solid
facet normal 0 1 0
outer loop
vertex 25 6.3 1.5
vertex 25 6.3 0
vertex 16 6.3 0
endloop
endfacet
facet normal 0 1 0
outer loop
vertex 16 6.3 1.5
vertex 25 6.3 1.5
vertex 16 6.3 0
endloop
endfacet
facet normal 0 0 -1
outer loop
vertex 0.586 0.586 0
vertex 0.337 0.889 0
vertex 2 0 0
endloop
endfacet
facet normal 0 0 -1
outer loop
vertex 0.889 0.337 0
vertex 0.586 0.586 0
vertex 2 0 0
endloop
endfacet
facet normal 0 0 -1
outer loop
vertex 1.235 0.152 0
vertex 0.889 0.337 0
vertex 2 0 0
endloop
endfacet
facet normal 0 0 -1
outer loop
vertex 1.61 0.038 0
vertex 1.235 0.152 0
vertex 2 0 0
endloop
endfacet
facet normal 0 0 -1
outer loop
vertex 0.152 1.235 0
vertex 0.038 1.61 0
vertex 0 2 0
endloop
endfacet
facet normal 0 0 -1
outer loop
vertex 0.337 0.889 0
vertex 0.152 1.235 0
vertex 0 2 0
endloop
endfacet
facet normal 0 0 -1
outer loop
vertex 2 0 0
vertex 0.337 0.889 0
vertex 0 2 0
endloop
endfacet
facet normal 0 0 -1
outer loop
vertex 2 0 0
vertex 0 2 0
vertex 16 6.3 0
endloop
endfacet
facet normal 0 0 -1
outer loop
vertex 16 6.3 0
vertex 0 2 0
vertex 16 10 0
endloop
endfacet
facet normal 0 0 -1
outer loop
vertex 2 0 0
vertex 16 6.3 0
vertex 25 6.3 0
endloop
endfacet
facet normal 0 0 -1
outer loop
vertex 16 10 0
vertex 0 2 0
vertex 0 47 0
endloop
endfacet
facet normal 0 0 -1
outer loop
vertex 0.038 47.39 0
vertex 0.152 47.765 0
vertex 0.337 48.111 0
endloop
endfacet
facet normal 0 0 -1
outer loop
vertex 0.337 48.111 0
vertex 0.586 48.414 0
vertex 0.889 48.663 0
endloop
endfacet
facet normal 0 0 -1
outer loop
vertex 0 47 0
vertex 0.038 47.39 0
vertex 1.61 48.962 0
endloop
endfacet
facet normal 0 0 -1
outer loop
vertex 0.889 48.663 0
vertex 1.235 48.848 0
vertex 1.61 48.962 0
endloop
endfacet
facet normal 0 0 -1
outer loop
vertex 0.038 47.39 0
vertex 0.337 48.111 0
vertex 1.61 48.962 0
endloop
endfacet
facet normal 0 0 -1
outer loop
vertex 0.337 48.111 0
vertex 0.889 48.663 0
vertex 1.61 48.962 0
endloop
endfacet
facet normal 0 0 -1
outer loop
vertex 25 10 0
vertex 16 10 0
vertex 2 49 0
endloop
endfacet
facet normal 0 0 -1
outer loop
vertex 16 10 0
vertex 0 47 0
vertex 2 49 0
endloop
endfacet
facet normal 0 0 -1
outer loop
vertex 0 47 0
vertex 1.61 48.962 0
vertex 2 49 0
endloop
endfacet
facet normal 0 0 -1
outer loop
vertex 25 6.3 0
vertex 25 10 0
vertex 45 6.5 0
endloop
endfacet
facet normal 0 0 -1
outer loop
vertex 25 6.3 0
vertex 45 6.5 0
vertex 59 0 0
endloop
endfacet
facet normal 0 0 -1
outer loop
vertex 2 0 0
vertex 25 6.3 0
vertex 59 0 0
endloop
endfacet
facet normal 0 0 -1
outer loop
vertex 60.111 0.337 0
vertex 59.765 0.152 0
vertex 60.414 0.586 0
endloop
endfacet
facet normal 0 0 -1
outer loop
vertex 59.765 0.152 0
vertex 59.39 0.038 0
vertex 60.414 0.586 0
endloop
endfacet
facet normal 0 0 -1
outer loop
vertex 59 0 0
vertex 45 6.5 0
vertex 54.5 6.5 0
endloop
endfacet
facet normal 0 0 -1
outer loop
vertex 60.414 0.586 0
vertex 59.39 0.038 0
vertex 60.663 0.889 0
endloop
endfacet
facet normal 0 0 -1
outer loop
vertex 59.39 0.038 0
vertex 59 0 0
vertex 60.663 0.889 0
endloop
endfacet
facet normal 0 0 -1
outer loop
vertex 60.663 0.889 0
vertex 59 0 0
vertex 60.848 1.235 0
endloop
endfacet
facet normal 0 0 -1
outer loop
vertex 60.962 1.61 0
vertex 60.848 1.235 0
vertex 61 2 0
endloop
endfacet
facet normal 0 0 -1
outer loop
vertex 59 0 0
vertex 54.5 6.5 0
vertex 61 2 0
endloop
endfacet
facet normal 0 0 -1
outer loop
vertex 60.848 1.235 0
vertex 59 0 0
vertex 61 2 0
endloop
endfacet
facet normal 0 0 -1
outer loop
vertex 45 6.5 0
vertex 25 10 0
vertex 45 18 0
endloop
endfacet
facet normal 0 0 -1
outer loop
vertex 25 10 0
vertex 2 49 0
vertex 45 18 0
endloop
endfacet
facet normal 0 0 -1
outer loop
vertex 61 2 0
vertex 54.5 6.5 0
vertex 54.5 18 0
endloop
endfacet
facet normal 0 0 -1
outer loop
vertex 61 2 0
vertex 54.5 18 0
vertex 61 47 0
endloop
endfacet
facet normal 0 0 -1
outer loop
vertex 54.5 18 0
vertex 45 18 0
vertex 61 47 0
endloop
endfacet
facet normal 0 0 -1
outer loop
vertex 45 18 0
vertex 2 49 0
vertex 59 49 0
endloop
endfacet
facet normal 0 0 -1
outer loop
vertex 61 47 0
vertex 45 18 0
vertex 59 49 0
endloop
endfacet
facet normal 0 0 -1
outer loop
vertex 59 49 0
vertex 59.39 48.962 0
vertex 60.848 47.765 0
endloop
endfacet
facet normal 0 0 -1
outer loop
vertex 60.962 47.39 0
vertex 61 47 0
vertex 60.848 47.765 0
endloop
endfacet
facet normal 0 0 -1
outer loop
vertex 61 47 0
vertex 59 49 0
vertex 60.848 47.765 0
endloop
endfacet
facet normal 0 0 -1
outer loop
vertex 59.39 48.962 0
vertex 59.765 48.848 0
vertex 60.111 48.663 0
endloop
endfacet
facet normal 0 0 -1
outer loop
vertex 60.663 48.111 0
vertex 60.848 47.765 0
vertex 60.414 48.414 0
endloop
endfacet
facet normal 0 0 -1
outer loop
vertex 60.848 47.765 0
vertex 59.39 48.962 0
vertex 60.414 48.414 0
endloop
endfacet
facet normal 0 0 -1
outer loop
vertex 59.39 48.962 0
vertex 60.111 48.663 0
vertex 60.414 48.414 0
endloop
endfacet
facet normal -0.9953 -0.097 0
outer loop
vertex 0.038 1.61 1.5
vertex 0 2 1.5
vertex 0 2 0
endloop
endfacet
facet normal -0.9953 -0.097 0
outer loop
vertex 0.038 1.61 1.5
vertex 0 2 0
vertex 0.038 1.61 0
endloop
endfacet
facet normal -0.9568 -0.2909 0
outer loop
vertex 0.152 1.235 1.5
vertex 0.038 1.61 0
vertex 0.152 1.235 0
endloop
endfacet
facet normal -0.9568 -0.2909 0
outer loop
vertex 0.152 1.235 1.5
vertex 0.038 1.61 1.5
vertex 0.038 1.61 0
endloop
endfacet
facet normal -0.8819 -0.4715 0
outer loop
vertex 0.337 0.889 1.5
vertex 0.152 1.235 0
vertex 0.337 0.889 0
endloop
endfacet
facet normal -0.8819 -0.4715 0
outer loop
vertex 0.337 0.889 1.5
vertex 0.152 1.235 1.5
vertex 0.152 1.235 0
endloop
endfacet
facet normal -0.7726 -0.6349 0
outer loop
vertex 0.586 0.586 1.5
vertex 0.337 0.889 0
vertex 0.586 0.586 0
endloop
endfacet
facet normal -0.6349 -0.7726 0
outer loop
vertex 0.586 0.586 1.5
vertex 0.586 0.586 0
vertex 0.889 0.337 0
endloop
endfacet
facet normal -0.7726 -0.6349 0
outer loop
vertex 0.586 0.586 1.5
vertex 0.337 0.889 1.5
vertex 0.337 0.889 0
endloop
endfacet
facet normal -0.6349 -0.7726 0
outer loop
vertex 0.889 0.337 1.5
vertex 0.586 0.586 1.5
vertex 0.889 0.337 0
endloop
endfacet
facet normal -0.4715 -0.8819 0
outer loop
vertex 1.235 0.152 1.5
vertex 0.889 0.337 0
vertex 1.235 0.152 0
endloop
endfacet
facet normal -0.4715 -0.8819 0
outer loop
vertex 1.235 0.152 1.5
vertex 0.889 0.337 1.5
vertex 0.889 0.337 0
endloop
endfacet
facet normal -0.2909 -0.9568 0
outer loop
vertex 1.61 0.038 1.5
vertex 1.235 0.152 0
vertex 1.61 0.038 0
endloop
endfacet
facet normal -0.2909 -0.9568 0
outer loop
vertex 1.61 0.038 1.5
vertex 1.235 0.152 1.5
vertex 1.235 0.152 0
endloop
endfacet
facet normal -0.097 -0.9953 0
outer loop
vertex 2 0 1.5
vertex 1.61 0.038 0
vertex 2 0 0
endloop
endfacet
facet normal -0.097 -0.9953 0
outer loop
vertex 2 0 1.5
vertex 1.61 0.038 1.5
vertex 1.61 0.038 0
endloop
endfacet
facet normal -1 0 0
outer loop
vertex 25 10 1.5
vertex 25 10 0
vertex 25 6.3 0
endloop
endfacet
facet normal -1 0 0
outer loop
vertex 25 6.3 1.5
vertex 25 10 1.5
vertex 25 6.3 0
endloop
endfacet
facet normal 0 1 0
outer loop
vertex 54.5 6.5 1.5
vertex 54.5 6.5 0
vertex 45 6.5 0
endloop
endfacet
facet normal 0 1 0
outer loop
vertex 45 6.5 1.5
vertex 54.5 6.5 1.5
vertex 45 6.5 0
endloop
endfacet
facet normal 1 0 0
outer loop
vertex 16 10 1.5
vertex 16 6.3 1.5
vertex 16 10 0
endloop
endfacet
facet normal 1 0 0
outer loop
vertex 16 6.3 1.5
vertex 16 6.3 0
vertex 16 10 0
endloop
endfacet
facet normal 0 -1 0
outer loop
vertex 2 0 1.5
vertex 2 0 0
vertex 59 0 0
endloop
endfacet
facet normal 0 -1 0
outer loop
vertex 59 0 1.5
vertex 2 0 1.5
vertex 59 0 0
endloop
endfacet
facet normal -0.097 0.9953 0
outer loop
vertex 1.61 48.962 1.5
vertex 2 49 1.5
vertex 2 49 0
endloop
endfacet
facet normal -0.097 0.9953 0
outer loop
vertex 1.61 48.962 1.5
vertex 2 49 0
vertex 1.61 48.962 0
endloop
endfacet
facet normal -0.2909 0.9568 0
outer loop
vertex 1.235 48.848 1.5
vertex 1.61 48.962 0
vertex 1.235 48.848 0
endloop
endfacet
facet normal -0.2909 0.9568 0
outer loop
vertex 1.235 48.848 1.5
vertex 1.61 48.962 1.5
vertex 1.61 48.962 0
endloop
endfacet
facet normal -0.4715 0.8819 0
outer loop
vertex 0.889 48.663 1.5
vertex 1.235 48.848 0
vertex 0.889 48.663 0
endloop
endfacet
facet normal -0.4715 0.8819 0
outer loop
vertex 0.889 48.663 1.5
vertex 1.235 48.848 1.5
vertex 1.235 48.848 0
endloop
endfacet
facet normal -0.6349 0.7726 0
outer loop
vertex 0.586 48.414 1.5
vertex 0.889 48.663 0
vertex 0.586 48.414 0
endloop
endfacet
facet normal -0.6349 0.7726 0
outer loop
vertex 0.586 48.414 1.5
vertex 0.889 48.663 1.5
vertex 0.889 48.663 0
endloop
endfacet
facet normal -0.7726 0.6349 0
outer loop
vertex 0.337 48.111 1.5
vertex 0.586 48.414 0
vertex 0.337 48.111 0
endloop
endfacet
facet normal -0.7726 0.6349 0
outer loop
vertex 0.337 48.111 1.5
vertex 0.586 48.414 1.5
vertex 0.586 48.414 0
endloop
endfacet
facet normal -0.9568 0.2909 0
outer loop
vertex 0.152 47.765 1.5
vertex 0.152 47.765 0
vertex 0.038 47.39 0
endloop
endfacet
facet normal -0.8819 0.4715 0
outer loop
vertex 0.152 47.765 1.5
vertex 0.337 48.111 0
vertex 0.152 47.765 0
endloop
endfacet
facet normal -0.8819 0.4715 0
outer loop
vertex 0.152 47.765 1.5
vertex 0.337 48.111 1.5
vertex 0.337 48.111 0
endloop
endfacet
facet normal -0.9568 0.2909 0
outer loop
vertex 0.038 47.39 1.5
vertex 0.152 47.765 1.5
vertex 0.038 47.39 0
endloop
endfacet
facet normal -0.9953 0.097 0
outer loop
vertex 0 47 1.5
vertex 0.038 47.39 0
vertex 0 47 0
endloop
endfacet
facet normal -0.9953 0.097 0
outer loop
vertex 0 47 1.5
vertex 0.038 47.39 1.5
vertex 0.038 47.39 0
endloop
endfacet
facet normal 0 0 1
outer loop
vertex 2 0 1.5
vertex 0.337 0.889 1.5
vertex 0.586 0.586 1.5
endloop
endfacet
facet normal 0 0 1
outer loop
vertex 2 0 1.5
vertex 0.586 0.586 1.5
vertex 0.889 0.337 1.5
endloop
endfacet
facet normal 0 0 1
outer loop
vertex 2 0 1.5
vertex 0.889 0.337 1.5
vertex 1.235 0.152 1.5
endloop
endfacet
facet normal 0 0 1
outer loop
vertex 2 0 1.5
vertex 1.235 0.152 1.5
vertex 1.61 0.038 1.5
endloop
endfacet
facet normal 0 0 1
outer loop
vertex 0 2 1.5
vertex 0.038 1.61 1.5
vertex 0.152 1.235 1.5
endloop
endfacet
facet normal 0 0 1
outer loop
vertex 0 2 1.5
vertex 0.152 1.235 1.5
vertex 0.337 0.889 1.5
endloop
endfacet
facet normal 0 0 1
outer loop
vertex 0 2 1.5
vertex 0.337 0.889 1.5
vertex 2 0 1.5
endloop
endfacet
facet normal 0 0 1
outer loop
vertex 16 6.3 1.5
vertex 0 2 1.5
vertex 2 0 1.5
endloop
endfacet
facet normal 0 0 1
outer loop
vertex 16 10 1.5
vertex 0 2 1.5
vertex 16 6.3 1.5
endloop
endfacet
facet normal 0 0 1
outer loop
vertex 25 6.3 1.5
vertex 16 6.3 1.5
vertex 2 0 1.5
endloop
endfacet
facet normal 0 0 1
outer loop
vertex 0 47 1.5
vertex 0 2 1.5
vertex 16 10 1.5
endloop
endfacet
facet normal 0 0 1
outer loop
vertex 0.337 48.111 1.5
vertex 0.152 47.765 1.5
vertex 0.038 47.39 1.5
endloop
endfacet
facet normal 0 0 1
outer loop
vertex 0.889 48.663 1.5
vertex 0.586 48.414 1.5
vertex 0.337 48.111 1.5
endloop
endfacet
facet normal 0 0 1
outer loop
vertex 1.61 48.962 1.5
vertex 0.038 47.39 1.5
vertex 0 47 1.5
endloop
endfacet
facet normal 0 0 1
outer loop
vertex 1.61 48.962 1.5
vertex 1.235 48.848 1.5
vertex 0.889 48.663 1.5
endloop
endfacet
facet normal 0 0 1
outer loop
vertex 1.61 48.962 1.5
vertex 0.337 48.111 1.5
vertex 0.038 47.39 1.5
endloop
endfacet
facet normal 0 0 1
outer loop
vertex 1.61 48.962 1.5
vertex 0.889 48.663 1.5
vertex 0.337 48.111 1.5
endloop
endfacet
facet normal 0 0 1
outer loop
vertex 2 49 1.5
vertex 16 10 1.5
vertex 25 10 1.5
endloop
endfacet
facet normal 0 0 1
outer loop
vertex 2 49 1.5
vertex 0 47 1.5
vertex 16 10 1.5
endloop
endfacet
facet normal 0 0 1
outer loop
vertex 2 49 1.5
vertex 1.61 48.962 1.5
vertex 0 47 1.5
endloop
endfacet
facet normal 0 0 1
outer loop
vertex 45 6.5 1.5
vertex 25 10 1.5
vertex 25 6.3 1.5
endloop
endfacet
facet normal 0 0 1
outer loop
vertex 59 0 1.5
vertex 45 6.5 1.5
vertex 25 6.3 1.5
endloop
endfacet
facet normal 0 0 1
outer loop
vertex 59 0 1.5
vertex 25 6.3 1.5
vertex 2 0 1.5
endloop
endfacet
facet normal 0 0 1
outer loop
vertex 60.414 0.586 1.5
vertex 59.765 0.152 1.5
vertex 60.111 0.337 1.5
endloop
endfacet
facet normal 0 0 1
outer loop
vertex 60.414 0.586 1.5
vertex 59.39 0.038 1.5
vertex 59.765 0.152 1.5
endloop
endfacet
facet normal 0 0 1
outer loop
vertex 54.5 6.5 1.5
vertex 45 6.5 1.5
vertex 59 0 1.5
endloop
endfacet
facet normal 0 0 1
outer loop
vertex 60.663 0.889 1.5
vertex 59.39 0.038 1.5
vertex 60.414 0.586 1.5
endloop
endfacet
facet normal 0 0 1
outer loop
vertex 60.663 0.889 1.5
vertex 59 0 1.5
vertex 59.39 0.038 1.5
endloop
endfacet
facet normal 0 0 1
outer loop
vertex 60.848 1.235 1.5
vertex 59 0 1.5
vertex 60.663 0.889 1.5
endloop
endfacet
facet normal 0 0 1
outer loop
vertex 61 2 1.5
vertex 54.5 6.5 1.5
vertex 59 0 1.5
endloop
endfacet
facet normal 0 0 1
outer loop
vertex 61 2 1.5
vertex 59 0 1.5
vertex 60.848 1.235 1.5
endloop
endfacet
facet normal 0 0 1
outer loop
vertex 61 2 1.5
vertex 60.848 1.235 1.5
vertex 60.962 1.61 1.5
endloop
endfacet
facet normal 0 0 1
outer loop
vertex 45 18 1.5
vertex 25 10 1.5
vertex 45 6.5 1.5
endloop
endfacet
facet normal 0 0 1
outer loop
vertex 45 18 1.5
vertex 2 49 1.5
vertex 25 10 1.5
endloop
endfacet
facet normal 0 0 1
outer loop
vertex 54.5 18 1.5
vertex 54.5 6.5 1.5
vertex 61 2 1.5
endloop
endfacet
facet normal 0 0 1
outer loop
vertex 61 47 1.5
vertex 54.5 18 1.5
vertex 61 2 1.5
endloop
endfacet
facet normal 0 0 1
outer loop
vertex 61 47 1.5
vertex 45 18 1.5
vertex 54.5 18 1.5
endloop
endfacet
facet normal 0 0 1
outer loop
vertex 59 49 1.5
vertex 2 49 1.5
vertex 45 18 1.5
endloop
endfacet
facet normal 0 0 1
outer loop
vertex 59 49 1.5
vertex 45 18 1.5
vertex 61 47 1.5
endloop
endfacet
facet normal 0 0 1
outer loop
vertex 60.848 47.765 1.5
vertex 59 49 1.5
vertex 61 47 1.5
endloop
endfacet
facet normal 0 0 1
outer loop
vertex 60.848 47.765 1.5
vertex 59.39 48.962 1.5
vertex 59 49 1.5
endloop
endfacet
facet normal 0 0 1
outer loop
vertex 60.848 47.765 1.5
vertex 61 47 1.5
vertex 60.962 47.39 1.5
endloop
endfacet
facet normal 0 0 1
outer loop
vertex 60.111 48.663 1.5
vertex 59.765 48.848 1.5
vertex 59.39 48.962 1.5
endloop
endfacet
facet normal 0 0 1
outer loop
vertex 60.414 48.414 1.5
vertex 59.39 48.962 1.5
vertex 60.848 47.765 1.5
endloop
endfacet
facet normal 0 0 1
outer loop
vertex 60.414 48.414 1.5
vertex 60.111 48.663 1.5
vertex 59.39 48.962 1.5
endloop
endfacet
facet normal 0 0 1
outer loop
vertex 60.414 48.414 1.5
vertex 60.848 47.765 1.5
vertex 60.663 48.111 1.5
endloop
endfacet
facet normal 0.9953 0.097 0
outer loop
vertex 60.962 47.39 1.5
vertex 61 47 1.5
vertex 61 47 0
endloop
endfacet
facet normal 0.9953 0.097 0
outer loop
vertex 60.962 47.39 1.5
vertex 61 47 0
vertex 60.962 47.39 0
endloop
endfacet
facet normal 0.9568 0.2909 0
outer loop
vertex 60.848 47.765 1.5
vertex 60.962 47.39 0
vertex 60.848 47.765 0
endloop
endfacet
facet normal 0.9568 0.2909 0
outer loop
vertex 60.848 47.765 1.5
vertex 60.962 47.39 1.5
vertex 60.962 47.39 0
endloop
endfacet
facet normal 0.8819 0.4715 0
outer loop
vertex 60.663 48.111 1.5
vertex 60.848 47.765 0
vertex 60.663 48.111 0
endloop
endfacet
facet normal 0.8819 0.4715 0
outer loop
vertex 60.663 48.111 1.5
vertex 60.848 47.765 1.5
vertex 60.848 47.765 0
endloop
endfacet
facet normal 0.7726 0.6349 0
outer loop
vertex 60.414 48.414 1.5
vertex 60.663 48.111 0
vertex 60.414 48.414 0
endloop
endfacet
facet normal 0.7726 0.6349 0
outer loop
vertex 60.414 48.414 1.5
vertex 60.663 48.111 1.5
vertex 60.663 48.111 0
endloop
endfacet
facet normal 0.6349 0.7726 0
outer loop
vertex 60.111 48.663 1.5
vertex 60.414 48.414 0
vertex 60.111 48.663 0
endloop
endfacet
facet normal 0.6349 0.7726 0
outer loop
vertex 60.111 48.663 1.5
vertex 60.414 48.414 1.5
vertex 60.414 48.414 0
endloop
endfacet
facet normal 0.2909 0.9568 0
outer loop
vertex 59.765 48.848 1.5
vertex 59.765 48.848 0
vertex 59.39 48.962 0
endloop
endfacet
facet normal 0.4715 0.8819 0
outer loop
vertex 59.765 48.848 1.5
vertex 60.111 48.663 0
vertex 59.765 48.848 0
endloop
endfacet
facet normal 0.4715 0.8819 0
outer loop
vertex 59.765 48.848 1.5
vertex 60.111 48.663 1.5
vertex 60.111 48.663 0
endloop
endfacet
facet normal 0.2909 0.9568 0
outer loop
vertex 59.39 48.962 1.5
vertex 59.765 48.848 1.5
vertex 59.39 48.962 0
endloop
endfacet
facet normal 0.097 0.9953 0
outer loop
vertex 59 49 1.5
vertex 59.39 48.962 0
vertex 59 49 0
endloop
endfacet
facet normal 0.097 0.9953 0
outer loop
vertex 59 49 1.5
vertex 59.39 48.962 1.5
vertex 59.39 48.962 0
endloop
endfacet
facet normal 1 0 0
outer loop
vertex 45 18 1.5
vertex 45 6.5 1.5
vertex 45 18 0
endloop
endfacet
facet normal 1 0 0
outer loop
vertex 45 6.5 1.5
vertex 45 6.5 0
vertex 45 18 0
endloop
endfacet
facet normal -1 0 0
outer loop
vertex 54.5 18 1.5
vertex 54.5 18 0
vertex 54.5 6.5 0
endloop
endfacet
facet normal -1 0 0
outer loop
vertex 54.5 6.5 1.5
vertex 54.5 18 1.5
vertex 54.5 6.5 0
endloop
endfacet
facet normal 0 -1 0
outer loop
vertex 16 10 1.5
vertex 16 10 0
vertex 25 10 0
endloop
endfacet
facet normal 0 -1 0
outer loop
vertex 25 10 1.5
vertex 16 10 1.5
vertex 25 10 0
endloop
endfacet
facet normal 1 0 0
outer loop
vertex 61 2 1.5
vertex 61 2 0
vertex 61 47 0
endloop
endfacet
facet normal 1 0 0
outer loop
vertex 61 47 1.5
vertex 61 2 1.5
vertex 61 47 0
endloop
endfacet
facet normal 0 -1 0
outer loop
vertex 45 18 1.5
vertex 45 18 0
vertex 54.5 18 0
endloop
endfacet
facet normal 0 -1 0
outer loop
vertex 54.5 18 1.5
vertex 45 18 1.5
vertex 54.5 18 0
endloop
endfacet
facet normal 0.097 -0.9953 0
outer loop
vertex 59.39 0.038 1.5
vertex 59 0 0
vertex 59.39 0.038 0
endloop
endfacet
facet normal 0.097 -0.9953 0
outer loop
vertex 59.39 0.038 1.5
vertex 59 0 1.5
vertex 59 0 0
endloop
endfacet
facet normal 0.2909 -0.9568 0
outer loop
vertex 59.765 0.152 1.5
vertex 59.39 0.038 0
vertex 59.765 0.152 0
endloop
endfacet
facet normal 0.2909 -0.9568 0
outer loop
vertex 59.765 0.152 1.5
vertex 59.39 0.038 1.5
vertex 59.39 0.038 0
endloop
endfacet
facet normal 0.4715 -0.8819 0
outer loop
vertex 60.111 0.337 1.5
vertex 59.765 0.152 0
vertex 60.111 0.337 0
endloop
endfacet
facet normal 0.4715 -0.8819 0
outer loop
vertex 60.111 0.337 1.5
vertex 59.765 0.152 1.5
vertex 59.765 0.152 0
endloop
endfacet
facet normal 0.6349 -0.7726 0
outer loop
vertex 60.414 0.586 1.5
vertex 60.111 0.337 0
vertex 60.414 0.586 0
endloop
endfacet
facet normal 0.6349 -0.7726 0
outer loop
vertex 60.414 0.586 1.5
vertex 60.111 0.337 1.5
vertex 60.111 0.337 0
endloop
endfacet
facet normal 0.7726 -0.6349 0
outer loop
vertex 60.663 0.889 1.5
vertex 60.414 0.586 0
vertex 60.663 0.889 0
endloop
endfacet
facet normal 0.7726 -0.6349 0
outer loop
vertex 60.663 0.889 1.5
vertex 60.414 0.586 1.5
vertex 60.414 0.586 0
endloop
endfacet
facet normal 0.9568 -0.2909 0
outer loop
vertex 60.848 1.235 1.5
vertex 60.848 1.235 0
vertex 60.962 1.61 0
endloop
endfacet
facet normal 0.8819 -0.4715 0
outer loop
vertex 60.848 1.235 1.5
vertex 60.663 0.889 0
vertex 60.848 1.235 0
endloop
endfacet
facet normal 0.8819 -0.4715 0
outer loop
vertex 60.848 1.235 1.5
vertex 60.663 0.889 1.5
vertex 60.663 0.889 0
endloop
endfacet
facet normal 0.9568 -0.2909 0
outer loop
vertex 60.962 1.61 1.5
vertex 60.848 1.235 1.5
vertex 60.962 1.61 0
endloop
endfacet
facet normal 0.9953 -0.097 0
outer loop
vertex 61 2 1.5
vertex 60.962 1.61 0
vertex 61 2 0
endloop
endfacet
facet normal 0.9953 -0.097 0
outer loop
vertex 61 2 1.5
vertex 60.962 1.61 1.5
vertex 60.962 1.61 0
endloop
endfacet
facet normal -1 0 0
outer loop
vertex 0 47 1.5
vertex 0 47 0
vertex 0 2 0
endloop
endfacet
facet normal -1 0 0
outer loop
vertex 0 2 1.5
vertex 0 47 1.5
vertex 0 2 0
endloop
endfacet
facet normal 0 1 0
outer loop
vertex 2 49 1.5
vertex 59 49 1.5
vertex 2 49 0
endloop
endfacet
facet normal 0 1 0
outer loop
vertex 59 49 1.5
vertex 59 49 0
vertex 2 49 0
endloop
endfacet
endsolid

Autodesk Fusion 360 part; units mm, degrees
sketch "Sketch1" plane through (0, 0, 0) normal (0, 0, 1) x (1, 0, 0)
  line L0 (0, 0) -> (61, 0)
  line L1 (61, 0) -> (61, 49)
  line L2 (61, 49) -> (0, 49)
  line L3 (0, 49) -> (0, 0)
  line L4 (16, 10) -> (25, 10)
  line L5 (25, 10) -> (25, 6.3)
  line L6 (25, 6.3) -> (16, 6.3)
  line L7 (16, 6.3) -> (16, 10)
  line L8 (45, 18) -> (54.5, 18)
  line L9 (54.5, 18) -> (54.5, 6.5)
  line L10 (54.5, 6.5) -> (45, 6.5)
  line L11 (45, 6.5) -> (45, 18)
  dimension "d1" = 61
  dimension "d2" = 49
  dimension "d3" = 9
  dimension "d4" = 3.7
  dimension "d5" = 10
  dimension "d6" = 16
  dimension "d7" = 9.5
  dimension "d8" = 11.5
  dimension "d9" = 45
  dimension "d10" = 18
extrude "Extrude1" add sketch "Sketch1" along normal blind 1.5
fillet "Fillet1" radius 2 4 edges at (0, 0, 0.75) (61, 0, 0.75) (61, 49, 0.75) (0, 49, 0.75)
